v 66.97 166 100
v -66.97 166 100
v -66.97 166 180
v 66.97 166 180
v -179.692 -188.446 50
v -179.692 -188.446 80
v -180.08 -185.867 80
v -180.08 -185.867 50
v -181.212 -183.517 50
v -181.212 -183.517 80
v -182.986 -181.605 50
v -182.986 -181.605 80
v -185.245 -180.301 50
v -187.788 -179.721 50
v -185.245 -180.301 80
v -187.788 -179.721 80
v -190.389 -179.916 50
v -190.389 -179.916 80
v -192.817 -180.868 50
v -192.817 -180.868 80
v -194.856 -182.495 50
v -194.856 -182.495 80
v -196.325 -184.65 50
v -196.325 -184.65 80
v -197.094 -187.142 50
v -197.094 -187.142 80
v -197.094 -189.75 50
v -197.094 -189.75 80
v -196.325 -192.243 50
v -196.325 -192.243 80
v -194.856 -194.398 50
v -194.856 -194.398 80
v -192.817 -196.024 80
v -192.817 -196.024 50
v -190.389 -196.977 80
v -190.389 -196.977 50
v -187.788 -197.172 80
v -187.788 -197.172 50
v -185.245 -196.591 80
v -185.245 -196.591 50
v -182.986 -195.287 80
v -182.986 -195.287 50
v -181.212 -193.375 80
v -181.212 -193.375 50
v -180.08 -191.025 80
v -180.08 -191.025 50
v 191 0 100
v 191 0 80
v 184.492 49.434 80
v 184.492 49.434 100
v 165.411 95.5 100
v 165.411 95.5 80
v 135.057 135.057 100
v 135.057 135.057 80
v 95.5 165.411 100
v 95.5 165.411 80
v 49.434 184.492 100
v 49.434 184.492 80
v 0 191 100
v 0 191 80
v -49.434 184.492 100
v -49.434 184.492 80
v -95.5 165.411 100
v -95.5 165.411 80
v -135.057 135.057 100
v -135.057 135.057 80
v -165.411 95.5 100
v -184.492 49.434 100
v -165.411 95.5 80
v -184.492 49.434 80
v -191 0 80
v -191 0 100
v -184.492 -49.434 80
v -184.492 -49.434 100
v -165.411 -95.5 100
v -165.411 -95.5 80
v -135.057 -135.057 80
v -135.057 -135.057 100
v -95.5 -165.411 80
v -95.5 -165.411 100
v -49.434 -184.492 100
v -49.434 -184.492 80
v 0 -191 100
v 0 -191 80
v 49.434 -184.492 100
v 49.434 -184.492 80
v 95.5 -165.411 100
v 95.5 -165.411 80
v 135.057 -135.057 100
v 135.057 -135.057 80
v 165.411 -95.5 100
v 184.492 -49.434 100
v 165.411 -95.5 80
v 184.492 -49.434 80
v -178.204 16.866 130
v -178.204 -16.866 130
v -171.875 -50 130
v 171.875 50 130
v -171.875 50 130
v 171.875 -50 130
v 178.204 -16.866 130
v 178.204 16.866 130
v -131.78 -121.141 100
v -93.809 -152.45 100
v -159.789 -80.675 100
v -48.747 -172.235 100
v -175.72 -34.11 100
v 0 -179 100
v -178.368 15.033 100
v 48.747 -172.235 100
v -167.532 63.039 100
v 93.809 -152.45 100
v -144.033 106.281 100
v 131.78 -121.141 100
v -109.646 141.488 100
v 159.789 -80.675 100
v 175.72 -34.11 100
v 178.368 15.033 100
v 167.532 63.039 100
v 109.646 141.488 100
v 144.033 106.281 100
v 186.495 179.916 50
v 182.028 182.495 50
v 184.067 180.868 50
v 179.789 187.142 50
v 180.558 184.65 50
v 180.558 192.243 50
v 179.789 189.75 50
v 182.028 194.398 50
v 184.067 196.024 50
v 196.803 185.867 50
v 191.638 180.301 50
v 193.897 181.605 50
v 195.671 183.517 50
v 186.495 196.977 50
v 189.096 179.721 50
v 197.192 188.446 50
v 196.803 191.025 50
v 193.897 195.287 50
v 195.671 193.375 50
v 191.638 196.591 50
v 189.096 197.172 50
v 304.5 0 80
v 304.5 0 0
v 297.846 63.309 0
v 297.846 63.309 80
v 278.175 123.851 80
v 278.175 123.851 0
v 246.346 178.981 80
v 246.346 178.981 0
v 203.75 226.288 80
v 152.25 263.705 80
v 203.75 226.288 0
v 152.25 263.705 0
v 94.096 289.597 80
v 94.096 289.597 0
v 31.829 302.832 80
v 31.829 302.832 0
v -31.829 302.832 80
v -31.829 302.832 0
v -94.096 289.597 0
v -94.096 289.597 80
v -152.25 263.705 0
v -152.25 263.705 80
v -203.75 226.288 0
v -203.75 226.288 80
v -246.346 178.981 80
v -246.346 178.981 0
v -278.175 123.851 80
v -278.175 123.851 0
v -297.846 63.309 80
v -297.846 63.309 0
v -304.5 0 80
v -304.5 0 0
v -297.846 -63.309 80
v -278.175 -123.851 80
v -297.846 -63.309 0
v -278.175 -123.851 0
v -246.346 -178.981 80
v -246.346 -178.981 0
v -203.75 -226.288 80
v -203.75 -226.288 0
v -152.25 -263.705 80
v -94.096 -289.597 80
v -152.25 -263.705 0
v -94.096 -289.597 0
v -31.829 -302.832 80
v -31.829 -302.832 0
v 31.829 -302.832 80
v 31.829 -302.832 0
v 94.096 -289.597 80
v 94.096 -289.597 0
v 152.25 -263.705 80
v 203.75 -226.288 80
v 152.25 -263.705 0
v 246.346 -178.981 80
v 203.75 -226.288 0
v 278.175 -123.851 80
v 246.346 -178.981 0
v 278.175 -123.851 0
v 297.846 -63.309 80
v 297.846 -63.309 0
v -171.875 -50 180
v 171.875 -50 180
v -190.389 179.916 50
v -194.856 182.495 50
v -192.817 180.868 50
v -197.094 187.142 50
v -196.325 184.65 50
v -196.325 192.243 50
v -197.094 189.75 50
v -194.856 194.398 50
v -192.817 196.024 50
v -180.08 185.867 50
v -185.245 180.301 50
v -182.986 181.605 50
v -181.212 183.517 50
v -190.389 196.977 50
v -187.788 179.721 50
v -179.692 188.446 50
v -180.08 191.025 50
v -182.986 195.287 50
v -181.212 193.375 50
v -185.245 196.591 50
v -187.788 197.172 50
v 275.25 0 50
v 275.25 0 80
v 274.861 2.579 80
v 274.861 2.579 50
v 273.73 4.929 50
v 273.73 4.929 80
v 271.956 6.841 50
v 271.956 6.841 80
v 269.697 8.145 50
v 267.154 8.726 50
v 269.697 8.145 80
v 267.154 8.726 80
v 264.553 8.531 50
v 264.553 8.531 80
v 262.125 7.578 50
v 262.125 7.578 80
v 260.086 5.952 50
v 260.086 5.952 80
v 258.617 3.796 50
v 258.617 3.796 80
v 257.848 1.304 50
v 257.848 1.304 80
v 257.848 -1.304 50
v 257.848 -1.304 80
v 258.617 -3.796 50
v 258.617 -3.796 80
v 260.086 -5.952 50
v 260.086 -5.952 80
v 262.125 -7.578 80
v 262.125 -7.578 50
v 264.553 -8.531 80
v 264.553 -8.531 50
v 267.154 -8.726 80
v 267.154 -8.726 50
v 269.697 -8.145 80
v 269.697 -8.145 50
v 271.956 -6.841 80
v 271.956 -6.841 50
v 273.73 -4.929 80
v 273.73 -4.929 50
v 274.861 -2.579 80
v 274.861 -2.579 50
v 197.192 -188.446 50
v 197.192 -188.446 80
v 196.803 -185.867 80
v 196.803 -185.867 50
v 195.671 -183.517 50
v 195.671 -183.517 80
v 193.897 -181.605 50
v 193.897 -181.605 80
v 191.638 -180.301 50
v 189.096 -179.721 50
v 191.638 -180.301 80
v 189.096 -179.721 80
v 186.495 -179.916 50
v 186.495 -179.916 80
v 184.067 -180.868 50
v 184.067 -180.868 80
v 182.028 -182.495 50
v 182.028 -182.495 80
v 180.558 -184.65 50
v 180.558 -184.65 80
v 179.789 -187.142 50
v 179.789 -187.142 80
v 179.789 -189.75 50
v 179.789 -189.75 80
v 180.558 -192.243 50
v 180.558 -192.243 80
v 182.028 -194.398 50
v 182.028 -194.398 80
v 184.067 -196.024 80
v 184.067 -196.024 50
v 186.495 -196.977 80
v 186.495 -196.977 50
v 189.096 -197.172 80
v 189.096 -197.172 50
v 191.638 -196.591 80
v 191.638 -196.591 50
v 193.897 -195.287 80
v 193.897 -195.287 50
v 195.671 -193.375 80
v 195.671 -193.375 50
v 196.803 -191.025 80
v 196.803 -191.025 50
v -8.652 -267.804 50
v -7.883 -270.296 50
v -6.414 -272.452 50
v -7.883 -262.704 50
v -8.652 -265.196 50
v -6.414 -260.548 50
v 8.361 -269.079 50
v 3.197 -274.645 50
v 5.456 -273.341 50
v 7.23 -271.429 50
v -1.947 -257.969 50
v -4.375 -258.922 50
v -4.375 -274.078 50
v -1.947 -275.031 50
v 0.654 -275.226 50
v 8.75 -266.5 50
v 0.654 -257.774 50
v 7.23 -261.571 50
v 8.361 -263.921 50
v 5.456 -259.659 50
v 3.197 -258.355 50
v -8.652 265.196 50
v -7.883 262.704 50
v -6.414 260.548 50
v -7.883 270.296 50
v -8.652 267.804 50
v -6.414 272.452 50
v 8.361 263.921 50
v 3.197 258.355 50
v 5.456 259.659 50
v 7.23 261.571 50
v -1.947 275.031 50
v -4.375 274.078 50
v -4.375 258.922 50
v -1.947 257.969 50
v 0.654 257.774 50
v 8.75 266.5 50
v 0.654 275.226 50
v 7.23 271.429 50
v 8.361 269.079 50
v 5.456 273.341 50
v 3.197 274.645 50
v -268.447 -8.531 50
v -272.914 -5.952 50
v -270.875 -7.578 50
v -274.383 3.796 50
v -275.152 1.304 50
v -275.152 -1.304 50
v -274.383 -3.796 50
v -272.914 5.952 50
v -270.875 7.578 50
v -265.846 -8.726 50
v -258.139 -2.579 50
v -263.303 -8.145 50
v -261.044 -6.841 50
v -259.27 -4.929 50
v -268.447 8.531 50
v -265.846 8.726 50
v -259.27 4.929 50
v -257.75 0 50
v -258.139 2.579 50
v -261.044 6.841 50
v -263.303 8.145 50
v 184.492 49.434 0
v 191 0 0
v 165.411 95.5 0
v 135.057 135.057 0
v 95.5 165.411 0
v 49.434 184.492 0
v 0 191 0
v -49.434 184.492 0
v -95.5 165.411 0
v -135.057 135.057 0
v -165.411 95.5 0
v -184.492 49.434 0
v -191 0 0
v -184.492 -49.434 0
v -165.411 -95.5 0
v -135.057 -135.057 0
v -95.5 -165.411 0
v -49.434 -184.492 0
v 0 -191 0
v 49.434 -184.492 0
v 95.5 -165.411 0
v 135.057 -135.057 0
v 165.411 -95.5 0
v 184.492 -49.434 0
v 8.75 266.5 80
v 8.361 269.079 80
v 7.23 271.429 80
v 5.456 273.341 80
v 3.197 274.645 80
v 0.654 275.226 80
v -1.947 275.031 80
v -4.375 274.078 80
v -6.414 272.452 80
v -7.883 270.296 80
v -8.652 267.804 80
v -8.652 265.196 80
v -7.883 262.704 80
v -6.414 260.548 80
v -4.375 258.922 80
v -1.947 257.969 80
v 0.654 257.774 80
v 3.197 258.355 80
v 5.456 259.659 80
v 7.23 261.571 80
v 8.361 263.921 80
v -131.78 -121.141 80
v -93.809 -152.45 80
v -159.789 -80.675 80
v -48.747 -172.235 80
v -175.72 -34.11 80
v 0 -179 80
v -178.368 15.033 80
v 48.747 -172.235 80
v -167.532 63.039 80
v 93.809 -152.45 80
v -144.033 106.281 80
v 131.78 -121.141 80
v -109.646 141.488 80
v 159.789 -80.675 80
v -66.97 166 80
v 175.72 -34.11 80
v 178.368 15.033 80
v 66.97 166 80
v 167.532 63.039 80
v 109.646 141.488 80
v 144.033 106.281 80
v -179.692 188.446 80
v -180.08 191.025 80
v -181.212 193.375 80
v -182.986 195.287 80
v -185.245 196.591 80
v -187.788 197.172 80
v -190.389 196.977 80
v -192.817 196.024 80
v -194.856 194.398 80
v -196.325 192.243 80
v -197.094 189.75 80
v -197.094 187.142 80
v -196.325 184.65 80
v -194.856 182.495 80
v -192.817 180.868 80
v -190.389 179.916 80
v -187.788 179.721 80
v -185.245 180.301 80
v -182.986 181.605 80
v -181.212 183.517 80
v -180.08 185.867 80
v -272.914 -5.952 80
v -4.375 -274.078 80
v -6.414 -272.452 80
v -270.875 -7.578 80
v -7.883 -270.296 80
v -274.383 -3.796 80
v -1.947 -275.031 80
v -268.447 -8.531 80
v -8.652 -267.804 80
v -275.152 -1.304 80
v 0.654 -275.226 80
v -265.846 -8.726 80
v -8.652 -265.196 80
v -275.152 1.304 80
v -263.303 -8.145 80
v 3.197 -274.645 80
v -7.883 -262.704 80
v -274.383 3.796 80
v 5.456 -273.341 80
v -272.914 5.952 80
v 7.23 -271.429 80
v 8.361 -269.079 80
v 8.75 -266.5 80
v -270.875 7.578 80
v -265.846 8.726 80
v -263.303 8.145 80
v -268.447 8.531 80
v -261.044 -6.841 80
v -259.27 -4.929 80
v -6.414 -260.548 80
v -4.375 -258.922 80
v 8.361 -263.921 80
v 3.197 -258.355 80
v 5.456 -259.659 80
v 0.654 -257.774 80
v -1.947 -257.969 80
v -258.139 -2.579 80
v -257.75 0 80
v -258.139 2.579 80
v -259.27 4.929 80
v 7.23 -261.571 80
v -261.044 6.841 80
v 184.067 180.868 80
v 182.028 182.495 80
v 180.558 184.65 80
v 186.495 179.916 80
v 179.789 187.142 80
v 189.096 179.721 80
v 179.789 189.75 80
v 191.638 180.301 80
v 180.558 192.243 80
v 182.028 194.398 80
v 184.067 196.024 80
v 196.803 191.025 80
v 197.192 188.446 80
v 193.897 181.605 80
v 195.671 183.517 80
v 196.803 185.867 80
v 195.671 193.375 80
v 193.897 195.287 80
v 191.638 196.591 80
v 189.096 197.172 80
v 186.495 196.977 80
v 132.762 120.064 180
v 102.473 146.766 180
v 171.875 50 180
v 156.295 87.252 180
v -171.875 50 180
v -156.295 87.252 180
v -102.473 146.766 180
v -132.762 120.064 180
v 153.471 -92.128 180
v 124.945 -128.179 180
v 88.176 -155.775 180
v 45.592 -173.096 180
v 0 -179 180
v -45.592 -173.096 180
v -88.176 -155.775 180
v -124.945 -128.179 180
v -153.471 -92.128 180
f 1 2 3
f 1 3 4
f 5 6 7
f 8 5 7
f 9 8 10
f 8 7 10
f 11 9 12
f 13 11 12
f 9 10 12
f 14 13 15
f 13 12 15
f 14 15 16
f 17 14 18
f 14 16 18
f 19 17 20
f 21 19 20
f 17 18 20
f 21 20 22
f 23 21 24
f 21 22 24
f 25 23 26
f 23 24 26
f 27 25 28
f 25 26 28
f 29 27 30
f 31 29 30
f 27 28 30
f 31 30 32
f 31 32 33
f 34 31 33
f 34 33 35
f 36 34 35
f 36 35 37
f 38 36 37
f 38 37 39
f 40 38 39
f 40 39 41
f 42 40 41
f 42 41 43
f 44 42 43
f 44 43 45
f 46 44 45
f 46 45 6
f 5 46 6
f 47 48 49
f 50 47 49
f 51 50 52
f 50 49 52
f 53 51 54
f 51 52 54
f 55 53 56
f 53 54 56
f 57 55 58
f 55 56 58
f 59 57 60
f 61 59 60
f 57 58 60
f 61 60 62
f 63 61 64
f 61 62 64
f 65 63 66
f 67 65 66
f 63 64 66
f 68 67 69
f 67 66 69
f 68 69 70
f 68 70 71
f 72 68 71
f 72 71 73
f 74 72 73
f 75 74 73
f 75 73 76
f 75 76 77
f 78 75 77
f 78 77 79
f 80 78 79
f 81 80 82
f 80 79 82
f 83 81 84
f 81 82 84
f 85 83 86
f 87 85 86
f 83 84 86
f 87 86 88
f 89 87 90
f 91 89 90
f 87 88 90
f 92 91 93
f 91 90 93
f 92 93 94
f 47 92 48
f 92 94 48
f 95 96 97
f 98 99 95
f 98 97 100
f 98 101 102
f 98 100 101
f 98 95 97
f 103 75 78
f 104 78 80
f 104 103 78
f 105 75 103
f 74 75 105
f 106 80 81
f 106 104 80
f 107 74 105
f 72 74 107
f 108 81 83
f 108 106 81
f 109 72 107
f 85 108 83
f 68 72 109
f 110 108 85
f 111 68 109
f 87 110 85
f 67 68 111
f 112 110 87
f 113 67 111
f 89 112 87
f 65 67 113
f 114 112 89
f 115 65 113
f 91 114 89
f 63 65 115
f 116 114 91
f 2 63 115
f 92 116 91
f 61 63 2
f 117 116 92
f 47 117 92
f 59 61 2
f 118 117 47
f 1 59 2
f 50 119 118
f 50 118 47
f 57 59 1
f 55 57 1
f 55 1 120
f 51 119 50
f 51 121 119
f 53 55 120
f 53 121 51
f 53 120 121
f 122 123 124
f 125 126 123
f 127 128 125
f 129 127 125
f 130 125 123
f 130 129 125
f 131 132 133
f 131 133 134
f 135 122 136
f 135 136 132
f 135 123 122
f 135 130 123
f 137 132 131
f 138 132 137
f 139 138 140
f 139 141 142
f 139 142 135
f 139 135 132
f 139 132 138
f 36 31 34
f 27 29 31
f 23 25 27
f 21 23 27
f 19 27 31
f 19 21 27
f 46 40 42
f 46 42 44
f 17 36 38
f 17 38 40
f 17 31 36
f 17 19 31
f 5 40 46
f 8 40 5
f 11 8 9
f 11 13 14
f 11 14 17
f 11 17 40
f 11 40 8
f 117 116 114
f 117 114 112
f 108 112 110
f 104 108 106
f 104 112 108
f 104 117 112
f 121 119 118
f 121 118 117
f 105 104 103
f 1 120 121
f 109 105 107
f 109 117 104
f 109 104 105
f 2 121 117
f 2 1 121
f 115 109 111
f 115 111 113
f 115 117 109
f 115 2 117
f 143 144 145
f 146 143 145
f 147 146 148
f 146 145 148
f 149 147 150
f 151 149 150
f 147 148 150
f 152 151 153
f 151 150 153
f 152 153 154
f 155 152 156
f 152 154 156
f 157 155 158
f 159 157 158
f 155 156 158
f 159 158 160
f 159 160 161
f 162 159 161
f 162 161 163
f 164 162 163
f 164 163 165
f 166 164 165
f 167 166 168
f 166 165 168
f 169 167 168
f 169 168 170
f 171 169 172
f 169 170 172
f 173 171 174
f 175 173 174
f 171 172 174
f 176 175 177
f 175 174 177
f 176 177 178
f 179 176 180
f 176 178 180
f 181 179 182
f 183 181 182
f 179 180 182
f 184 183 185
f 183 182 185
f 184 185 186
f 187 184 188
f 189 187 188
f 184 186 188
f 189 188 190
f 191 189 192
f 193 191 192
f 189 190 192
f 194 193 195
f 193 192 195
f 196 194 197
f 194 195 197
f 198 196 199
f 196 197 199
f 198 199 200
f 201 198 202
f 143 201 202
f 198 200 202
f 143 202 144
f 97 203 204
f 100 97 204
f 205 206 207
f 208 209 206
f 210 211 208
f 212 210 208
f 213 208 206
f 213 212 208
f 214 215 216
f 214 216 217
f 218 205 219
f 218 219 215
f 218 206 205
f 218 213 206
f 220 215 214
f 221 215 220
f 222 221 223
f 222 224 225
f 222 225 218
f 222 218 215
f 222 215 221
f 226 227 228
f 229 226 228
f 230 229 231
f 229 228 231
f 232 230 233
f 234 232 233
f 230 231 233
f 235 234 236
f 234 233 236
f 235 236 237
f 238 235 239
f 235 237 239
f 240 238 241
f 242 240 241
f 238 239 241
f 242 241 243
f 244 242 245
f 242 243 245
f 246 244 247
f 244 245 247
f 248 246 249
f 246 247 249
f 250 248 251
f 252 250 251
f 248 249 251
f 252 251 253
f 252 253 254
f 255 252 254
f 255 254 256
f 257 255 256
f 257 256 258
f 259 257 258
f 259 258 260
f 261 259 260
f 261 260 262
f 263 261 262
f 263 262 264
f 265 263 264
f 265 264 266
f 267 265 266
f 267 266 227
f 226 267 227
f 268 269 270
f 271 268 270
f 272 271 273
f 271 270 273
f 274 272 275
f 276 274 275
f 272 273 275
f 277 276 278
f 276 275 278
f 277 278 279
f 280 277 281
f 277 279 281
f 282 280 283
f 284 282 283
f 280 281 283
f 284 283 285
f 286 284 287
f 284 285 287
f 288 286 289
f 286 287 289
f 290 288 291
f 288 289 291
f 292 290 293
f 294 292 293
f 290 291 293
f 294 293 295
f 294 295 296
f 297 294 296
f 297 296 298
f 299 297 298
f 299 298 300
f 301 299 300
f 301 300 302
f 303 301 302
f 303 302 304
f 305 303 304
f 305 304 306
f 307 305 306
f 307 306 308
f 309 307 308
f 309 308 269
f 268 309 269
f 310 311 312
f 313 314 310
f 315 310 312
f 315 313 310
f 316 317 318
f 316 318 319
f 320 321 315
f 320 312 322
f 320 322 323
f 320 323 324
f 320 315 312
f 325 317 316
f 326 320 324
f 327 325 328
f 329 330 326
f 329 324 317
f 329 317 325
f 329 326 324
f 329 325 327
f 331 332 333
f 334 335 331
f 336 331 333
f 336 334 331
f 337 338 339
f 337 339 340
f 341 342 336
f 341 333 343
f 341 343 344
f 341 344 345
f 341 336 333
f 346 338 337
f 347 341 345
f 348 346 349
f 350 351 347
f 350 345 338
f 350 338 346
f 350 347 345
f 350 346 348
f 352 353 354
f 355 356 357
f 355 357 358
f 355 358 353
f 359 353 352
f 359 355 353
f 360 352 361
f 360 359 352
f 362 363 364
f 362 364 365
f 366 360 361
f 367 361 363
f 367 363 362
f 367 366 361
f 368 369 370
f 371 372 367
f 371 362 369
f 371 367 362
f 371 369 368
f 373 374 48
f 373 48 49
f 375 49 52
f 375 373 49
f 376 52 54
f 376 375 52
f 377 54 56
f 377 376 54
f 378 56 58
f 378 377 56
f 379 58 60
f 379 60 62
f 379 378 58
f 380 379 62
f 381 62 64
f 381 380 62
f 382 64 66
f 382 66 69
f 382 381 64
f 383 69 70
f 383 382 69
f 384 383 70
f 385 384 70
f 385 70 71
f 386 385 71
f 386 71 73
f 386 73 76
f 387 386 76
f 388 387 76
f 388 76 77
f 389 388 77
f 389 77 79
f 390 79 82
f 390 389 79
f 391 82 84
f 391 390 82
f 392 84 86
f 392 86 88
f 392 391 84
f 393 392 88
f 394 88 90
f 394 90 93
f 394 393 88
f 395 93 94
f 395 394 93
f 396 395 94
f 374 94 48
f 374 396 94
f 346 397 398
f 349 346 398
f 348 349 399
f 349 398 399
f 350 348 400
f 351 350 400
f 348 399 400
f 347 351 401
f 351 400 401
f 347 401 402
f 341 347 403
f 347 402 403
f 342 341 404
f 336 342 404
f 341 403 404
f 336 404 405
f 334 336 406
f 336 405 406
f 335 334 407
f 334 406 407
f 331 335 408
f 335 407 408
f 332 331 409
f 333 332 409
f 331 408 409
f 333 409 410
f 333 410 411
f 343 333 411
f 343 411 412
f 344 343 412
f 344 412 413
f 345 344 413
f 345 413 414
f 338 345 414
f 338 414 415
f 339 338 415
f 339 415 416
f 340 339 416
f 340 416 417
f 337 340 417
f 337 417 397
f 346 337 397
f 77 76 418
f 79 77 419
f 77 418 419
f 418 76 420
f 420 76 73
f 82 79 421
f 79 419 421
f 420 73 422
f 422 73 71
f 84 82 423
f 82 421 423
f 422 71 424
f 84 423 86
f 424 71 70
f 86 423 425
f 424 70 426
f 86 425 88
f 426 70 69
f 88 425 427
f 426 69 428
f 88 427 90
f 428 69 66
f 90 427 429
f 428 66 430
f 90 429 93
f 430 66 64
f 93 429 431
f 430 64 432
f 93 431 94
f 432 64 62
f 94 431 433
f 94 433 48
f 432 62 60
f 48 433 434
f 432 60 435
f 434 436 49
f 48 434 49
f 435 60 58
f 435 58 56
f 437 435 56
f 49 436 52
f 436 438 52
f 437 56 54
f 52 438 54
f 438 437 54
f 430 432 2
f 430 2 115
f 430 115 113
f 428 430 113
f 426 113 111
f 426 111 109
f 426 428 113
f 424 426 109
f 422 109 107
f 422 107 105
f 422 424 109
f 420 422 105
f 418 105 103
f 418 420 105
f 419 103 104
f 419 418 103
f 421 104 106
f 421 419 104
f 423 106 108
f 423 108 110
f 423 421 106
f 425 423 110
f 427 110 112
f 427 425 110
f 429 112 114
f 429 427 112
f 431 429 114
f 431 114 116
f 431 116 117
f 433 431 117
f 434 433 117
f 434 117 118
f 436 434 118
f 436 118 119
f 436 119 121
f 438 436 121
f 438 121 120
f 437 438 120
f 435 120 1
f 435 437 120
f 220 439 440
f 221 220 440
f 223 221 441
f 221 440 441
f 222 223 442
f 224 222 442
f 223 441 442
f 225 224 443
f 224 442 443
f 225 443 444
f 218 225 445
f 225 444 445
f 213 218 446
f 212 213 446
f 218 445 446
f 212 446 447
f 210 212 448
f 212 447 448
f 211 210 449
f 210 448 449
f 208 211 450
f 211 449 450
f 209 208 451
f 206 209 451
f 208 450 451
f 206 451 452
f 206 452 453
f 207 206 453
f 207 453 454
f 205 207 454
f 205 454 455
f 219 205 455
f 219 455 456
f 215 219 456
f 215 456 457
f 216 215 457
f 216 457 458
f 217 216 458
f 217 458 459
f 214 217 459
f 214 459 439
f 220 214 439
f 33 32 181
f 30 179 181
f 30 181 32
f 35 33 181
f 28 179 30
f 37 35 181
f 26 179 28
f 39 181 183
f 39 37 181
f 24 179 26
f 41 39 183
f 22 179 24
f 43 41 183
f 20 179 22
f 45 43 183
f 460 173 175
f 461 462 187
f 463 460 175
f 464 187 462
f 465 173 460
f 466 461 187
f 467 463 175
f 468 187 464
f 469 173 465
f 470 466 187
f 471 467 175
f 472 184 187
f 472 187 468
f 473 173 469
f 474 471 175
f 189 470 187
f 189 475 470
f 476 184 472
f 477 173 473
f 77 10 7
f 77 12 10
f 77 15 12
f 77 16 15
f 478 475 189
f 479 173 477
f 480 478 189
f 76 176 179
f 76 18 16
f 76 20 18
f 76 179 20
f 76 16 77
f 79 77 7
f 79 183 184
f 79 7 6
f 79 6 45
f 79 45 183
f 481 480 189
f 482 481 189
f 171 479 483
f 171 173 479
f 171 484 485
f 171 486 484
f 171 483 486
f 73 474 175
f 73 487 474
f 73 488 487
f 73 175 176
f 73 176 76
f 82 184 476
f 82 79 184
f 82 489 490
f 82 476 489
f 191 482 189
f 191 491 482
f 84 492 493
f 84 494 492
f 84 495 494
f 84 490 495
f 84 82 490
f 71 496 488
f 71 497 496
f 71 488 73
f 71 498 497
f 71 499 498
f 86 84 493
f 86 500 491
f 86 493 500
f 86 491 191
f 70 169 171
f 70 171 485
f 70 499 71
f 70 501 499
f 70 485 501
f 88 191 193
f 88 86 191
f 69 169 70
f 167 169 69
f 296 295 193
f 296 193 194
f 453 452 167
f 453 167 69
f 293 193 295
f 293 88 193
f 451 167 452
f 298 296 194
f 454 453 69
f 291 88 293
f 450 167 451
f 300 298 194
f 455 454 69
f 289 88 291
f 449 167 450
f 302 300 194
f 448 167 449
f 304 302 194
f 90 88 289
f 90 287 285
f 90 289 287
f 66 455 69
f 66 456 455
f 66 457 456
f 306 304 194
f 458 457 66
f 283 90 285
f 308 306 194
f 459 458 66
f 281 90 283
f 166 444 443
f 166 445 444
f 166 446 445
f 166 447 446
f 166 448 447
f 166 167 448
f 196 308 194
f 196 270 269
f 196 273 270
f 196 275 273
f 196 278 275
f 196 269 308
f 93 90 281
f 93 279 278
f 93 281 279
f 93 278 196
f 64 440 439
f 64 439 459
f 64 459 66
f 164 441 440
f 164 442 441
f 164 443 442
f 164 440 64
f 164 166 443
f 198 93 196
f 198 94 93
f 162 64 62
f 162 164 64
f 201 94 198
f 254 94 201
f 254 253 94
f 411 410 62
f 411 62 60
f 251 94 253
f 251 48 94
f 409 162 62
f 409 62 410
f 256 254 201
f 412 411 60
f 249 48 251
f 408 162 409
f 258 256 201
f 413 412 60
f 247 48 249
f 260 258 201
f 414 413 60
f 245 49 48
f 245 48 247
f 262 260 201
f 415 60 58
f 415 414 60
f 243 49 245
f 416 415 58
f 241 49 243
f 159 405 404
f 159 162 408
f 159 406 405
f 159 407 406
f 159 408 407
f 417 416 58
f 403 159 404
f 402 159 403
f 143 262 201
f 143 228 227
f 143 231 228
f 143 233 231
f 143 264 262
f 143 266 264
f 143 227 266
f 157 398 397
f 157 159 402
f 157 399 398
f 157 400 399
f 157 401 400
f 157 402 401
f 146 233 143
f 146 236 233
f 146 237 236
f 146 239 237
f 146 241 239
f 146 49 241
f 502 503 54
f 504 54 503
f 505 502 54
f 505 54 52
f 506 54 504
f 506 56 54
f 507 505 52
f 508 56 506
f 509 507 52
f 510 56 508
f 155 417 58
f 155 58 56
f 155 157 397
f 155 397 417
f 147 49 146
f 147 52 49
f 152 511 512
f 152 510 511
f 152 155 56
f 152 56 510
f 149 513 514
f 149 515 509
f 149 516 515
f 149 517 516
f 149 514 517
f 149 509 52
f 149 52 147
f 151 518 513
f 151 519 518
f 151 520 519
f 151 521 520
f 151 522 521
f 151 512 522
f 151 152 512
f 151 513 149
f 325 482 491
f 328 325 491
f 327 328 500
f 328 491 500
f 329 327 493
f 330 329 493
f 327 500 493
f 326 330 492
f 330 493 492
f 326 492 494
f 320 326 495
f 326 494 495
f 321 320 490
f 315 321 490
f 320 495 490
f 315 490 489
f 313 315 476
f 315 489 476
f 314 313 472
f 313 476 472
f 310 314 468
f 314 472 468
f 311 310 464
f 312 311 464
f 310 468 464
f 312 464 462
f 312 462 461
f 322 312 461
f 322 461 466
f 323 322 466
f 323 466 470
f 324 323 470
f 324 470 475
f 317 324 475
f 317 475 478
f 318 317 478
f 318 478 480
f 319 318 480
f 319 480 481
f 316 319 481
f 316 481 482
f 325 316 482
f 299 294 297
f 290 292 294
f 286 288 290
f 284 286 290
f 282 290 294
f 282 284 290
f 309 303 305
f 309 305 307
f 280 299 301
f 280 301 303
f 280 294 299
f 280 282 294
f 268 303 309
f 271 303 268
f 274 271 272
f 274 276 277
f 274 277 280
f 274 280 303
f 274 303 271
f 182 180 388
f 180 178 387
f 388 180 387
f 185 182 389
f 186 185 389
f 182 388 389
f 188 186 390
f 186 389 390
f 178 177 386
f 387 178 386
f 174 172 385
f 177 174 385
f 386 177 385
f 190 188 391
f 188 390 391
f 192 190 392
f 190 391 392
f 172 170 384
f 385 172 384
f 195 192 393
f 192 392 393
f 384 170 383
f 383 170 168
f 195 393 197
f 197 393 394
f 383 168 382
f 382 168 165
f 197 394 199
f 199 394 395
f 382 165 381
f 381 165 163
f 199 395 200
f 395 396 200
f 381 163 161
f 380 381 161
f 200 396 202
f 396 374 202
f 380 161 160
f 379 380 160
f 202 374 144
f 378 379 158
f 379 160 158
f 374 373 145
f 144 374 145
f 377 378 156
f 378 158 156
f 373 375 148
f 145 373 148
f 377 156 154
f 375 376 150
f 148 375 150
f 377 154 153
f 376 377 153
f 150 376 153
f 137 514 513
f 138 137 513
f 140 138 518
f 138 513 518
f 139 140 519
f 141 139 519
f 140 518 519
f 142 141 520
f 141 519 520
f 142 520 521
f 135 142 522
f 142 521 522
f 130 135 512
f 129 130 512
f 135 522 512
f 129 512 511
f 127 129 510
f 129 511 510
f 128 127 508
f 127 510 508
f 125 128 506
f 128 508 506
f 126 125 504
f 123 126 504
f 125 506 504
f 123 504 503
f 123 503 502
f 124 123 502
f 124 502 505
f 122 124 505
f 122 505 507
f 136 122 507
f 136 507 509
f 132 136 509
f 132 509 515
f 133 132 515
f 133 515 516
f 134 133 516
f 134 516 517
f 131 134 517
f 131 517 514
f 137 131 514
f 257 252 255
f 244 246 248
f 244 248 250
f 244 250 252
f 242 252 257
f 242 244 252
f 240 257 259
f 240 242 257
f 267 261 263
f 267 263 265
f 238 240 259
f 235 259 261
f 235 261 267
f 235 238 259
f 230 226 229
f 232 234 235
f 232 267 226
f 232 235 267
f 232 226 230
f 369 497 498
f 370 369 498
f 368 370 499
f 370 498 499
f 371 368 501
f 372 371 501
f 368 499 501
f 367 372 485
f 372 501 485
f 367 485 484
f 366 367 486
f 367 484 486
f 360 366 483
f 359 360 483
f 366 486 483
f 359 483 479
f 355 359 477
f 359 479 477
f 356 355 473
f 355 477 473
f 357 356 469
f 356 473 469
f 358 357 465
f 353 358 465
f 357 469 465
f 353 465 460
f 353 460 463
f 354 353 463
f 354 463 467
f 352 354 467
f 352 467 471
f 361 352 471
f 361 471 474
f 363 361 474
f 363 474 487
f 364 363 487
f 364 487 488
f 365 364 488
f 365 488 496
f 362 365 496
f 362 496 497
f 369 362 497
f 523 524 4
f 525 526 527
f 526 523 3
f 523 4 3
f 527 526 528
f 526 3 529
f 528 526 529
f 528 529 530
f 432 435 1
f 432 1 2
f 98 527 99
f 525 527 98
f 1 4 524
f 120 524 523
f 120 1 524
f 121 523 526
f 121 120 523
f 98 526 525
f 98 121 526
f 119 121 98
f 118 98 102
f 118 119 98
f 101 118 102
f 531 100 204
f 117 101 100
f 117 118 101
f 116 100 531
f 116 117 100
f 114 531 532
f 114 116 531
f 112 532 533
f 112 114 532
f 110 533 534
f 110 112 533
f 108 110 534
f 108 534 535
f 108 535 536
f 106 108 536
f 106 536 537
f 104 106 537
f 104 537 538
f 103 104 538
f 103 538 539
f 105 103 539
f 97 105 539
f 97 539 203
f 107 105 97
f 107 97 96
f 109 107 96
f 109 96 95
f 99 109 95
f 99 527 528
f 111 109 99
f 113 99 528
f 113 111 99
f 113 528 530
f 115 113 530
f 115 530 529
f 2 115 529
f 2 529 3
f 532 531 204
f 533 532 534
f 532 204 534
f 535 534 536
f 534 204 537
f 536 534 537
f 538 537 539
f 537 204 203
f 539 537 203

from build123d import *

# Parameters (mm, degrees)
SKETCH1_R           = 304.5
SKETCH1_R_2         = 266.5
SKETCH1_R_3         = 191
BOSS_EXTRUDE2_DEPTH = 80
SKETCH2_R           = 191
BOSS_EXTRUDE3_DEPTH = 20
BOSS_EXTRUDE4_DEPTH = 80
SKETCH4_W           = 368.678721924
SKETCH4_H           = 100
CUT_EXTRUDE1_DEPTH  = 50
SKETCH5_R           = 8.75
CUT_EXTRUDE2_DEPTH  = 130


with BuildPart() as part:
    # Sketch1 → Boss-Extrude2 (new body)
    with BuildSketch(Plane.XY):
        Circle(SKETCH1_R)
        Circle(SKETCH1_R_2, mode=Mode.SUBTRACT)
        Circle(SKETCH1_R_2)
        Circle(SKETCH1_R_3, mode=Mode.SUBTRACT)
    extrude(amount=BOSS_EXTRUDE2_DEPTH)

    # Sketch5 → Cut-Extrude2 (cut)
    with BuildSketch(Plane.XY.offset(180)):
        with Locations((-188.441718833, 188.446195513)):
            Circle(SKETCH5_R)
        with Locations((-266.5, 0)):
            Circle(SKETCH5_R)
        with Locations((-188.441718833, -188.446195513)):
            Circle(SKETCH5_R)
        with Locations((0, -266.5)):
            Circle(SKETCH5_R)
        with Locations((188.441718833, -188.446195513)):
            Circle(SKETCH5_R)
        with Locations((266.5, 0)):
            Circle(SKETCH5_R)
        with Locations((188.441718833, 188.446195513)):
            Circle(SKETCH5_R)
        with Locations((0, 266.5)):
            Circle(SKETCH5_R)
    extrude(amount=-CUT_EXTRUDE2_DEPTH, mode=Mode.SUBTRACT)


with BuildPart() as body_2:
    # Sketch2 → Boss-Extrude3 (new body)
    with BuildSketch(Plane.XY.offset(80)):
        Circle(SKETCH2_R)
        with BuildLine():
            ThreePointArc((-66.970142601, 166), (0, -179), (66.970142601, 166))
            Line((66.970142601, 166), (-66.970142601, 166))
        make_face(mode=Mode.SUBTRACT)
    extrude(amount=BOSS_EXTRUDE3_DEPTH)


with BuildPart() as body_3:
    # Sketch3 → Boss-Extrude4 (new body)
    with BuildSketch(Plane.XY.offset(100)):
        with BuildLine():
            Line((-66.970142601, 166), (66.970142601, 166))
            ThreePointArc((66.970142601, 166), (0, -179), (-66.970142601, 166))
        make_face()
    extrude(amount=BOSS_EXTRUDE4_DEPTH)

    # Sketch4 → Cut-Extrude1 (cut)
    with BuildSketch(Plane.XY.offset(180)):
        Rectangle(SKETCH4_W, SKETCH4_H)
    extrude(amount=-CUT_EXTRUDE1_DEPTH, mode=Mode.SUBTRACT)


solid = Compound([part.part, body_2.part, body_3.part])
